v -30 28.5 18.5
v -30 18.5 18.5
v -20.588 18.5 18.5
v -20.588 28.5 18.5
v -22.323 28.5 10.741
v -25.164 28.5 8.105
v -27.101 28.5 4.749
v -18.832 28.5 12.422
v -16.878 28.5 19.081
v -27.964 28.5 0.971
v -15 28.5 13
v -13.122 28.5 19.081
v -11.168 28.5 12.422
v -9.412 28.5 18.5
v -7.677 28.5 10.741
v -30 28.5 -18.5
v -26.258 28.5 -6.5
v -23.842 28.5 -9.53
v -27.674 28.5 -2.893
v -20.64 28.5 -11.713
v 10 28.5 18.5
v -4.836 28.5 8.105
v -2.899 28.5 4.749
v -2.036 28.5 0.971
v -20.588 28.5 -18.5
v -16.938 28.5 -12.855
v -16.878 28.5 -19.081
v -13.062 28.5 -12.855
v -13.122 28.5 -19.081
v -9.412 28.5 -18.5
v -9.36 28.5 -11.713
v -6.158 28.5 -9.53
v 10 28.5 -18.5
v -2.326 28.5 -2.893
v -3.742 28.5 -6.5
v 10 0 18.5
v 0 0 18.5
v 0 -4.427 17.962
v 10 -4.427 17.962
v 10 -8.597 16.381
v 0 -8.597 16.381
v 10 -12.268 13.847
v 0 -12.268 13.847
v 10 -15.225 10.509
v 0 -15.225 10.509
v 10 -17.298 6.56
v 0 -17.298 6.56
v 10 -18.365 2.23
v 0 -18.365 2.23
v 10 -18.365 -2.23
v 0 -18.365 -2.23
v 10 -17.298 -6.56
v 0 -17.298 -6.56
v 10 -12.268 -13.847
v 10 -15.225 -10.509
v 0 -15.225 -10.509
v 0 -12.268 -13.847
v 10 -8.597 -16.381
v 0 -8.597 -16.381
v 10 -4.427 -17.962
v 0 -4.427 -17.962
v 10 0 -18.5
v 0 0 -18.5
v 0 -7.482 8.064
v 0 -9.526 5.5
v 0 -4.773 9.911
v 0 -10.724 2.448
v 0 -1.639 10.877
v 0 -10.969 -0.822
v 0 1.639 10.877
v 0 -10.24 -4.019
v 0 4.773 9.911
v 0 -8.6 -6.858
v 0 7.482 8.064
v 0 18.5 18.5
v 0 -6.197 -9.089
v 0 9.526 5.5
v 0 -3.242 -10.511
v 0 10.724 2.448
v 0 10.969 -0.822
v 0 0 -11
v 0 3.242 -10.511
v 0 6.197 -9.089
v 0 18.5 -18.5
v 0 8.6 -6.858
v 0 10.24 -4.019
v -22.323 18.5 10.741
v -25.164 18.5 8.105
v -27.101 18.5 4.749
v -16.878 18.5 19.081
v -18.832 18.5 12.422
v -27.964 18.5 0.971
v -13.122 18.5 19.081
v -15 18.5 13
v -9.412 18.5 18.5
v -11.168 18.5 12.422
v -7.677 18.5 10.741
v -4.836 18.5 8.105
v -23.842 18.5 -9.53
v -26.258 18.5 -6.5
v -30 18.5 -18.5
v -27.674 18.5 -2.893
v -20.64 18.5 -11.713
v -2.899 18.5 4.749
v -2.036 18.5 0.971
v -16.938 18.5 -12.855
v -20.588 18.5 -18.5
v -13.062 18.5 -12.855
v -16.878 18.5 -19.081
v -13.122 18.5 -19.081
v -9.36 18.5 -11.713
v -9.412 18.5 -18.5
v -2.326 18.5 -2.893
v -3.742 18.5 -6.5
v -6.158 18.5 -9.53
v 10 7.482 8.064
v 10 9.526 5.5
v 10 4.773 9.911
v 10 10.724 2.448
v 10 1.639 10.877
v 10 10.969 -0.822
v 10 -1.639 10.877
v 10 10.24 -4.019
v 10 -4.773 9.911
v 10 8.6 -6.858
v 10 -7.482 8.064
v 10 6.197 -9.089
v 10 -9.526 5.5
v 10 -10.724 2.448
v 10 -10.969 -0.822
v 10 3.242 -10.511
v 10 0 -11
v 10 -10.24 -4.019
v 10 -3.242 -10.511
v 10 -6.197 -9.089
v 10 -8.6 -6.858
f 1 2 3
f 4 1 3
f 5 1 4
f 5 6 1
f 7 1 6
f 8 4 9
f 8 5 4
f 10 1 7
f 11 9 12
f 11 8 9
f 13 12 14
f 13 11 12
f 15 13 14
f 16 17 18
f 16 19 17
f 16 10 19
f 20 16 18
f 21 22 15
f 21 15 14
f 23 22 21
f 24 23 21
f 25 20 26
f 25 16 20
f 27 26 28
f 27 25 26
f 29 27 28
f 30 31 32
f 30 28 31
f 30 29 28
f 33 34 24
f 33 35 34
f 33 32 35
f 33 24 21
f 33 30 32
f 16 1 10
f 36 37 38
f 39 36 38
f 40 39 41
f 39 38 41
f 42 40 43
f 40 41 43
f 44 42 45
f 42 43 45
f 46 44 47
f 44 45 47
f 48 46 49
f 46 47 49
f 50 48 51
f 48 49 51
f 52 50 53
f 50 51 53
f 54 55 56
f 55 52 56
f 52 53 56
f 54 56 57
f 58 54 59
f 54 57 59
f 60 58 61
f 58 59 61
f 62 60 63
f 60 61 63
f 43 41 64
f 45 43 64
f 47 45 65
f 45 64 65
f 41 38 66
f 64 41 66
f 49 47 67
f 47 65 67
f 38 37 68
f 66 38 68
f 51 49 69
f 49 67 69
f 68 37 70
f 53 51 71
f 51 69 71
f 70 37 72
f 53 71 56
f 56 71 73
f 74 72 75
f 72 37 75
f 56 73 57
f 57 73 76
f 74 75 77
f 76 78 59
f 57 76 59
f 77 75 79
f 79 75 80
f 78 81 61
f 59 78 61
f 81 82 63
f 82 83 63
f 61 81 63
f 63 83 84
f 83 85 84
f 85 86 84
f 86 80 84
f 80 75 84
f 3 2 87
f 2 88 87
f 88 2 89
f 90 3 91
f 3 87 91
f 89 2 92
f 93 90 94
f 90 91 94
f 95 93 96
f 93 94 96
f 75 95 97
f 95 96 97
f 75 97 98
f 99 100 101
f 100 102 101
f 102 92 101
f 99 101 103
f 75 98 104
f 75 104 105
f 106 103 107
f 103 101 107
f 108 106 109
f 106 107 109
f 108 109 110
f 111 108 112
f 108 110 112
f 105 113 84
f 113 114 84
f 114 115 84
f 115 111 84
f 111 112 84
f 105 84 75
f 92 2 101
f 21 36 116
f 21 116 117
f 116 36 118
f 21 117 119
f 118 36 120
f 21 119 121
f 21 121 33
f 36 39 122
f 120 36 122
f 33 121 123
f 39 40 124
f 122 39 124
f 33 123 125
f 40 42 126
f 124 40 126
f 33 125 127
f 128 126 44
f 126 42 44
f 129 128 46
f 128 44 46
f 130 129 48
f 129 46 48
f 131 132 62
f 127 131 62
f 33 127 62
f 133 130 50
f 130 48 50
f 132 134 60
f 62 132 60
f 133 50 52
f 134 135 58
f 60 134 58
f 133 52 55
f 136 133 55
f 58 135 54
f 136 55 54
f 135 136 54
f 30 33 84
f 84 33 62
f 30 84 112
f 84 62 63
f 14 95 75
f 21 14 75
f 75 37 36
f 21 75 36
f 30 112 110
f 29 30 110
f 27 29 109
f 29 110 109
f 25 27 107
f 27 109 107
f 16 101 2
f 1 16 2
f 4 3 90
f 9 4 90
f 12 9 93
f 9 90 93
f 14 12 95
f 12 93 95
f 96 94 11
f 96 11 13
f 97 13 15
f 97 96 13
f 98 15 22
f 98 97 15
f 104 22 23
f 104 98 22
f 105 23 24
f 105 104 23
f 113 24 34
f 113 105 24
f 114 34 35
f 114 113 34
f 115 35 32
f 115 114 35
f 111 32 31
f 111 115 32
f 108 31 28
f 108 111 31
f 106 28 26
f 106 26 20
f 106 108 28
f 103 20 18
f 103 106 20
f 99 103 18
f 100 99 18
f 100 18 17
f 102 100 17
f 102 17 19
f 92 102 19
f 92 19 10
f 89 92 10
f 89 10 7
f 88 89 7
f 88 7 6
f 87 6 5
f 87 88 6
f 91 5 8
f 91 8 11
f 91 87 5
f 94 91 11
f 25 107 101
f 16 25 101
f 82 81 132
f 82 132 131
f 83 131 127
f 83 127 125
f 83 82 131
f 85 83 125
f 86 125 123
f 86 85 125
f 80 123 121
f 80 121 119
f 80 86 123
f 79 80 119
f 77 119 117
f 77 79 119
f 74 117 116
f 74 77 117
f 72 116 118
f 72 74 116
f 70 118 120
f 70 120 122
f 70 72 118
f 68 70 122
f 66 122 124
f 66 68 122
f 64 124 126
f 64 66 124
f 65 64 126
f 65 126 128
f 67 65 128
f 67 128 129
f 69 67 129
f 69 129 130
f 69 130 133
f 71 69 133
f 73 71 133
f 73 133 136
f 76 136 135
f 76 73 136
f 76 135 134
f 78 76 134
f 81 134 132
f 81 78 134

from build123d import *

# Parameters (mm, degrees)
SKETCH1_R           = 18.5
SKETCH1_R_2         = 11
BOSS_EXTRUDE1_DEPTH = 10
BOSS_EXTRUDE2_REACH = 44.559
SKETCH2_W           = 10
SKETCH2_H           = 37
SKETCH2_3_R         = 13
BOSS_EXTRUDE3_DEPTH = 10


with BuildPart() as part:
    # Sketch1 → Boss-Extrude1 (new body)
    with BuildSketch(Plane(origin=(0, 0, 0), x_dir=(0, 0, -1), z_dir=(1, 0, 0))):
        Circle(SKETCH1_R)
        Circle(SKETCH1_R_2, mode=Mode.SUBTRACT)
    extrude(amount=BOSS_EXTRUDE1_DEPTH)

    # Sketch2 → Boss-Extrude2 (add, up to next)
    with BuildSketch(Plane(origin=(0, 18.5, 0), x_dir=(1, 0, 0), z_dir=(0, 1, 0)), mode=Mode.PRIVATE) as boss_extrude2_sk1:
        with Locations((5, 0)):
            Rectangle(SKETCH2_W, SKETCH2_H)
    boss_extrude2_tool1 = extrude(boss_extrude2_sk1.sketch, amount=-BOSS_EXTRUDE2_REACH, mode=Mode.PRIVATE) - part.part
    add(boss_extrude2_tool1.solids().sort_by_distance((5, 18.5, 0))[0])
    add(boss_extrude2_tool1.solids().sort_by_distance((5, 18.5, 0))[1])

    # Sketch2<3> → Boss-Extrude3 (add)
    with BuildSketch(Plane(origin=(0, 18.5, 0), x_dir=(1, 0, 0), z_dir=(0, 1, 0))):
        with BuildLine():
            Line((10, -18.5), (10, 18.5))
            Line((10, 18.5), (-9.411981237, 18.5))
            ThreePointArc((-9.411981237, 18.5), (-15, 19.153967532), (-20.588018763, 18.5))
            Line((-20.588018763, 18.5), (-30, 18.5))
            Line((-30, 18.5), (-30, -18.5))
            Line((-30, -18.5), (-20.588018763, -18.5))
            ThreePointArc((-20.588018763, -18.5), (-15, -19.153967532), (-9.411981237, -18.5))
            Line((-9.411981237, -18.5), (10, -18.5))
        make_face()
        with Locations(Location((-15, 0, 0), (0, 0, 270))):
            Circle(SKETCH2_3_R, mode=Mode.SUBTRACT)
    extrude(amount=BOSS_EXTRUDE3_DEPTH)


solid = part.part
